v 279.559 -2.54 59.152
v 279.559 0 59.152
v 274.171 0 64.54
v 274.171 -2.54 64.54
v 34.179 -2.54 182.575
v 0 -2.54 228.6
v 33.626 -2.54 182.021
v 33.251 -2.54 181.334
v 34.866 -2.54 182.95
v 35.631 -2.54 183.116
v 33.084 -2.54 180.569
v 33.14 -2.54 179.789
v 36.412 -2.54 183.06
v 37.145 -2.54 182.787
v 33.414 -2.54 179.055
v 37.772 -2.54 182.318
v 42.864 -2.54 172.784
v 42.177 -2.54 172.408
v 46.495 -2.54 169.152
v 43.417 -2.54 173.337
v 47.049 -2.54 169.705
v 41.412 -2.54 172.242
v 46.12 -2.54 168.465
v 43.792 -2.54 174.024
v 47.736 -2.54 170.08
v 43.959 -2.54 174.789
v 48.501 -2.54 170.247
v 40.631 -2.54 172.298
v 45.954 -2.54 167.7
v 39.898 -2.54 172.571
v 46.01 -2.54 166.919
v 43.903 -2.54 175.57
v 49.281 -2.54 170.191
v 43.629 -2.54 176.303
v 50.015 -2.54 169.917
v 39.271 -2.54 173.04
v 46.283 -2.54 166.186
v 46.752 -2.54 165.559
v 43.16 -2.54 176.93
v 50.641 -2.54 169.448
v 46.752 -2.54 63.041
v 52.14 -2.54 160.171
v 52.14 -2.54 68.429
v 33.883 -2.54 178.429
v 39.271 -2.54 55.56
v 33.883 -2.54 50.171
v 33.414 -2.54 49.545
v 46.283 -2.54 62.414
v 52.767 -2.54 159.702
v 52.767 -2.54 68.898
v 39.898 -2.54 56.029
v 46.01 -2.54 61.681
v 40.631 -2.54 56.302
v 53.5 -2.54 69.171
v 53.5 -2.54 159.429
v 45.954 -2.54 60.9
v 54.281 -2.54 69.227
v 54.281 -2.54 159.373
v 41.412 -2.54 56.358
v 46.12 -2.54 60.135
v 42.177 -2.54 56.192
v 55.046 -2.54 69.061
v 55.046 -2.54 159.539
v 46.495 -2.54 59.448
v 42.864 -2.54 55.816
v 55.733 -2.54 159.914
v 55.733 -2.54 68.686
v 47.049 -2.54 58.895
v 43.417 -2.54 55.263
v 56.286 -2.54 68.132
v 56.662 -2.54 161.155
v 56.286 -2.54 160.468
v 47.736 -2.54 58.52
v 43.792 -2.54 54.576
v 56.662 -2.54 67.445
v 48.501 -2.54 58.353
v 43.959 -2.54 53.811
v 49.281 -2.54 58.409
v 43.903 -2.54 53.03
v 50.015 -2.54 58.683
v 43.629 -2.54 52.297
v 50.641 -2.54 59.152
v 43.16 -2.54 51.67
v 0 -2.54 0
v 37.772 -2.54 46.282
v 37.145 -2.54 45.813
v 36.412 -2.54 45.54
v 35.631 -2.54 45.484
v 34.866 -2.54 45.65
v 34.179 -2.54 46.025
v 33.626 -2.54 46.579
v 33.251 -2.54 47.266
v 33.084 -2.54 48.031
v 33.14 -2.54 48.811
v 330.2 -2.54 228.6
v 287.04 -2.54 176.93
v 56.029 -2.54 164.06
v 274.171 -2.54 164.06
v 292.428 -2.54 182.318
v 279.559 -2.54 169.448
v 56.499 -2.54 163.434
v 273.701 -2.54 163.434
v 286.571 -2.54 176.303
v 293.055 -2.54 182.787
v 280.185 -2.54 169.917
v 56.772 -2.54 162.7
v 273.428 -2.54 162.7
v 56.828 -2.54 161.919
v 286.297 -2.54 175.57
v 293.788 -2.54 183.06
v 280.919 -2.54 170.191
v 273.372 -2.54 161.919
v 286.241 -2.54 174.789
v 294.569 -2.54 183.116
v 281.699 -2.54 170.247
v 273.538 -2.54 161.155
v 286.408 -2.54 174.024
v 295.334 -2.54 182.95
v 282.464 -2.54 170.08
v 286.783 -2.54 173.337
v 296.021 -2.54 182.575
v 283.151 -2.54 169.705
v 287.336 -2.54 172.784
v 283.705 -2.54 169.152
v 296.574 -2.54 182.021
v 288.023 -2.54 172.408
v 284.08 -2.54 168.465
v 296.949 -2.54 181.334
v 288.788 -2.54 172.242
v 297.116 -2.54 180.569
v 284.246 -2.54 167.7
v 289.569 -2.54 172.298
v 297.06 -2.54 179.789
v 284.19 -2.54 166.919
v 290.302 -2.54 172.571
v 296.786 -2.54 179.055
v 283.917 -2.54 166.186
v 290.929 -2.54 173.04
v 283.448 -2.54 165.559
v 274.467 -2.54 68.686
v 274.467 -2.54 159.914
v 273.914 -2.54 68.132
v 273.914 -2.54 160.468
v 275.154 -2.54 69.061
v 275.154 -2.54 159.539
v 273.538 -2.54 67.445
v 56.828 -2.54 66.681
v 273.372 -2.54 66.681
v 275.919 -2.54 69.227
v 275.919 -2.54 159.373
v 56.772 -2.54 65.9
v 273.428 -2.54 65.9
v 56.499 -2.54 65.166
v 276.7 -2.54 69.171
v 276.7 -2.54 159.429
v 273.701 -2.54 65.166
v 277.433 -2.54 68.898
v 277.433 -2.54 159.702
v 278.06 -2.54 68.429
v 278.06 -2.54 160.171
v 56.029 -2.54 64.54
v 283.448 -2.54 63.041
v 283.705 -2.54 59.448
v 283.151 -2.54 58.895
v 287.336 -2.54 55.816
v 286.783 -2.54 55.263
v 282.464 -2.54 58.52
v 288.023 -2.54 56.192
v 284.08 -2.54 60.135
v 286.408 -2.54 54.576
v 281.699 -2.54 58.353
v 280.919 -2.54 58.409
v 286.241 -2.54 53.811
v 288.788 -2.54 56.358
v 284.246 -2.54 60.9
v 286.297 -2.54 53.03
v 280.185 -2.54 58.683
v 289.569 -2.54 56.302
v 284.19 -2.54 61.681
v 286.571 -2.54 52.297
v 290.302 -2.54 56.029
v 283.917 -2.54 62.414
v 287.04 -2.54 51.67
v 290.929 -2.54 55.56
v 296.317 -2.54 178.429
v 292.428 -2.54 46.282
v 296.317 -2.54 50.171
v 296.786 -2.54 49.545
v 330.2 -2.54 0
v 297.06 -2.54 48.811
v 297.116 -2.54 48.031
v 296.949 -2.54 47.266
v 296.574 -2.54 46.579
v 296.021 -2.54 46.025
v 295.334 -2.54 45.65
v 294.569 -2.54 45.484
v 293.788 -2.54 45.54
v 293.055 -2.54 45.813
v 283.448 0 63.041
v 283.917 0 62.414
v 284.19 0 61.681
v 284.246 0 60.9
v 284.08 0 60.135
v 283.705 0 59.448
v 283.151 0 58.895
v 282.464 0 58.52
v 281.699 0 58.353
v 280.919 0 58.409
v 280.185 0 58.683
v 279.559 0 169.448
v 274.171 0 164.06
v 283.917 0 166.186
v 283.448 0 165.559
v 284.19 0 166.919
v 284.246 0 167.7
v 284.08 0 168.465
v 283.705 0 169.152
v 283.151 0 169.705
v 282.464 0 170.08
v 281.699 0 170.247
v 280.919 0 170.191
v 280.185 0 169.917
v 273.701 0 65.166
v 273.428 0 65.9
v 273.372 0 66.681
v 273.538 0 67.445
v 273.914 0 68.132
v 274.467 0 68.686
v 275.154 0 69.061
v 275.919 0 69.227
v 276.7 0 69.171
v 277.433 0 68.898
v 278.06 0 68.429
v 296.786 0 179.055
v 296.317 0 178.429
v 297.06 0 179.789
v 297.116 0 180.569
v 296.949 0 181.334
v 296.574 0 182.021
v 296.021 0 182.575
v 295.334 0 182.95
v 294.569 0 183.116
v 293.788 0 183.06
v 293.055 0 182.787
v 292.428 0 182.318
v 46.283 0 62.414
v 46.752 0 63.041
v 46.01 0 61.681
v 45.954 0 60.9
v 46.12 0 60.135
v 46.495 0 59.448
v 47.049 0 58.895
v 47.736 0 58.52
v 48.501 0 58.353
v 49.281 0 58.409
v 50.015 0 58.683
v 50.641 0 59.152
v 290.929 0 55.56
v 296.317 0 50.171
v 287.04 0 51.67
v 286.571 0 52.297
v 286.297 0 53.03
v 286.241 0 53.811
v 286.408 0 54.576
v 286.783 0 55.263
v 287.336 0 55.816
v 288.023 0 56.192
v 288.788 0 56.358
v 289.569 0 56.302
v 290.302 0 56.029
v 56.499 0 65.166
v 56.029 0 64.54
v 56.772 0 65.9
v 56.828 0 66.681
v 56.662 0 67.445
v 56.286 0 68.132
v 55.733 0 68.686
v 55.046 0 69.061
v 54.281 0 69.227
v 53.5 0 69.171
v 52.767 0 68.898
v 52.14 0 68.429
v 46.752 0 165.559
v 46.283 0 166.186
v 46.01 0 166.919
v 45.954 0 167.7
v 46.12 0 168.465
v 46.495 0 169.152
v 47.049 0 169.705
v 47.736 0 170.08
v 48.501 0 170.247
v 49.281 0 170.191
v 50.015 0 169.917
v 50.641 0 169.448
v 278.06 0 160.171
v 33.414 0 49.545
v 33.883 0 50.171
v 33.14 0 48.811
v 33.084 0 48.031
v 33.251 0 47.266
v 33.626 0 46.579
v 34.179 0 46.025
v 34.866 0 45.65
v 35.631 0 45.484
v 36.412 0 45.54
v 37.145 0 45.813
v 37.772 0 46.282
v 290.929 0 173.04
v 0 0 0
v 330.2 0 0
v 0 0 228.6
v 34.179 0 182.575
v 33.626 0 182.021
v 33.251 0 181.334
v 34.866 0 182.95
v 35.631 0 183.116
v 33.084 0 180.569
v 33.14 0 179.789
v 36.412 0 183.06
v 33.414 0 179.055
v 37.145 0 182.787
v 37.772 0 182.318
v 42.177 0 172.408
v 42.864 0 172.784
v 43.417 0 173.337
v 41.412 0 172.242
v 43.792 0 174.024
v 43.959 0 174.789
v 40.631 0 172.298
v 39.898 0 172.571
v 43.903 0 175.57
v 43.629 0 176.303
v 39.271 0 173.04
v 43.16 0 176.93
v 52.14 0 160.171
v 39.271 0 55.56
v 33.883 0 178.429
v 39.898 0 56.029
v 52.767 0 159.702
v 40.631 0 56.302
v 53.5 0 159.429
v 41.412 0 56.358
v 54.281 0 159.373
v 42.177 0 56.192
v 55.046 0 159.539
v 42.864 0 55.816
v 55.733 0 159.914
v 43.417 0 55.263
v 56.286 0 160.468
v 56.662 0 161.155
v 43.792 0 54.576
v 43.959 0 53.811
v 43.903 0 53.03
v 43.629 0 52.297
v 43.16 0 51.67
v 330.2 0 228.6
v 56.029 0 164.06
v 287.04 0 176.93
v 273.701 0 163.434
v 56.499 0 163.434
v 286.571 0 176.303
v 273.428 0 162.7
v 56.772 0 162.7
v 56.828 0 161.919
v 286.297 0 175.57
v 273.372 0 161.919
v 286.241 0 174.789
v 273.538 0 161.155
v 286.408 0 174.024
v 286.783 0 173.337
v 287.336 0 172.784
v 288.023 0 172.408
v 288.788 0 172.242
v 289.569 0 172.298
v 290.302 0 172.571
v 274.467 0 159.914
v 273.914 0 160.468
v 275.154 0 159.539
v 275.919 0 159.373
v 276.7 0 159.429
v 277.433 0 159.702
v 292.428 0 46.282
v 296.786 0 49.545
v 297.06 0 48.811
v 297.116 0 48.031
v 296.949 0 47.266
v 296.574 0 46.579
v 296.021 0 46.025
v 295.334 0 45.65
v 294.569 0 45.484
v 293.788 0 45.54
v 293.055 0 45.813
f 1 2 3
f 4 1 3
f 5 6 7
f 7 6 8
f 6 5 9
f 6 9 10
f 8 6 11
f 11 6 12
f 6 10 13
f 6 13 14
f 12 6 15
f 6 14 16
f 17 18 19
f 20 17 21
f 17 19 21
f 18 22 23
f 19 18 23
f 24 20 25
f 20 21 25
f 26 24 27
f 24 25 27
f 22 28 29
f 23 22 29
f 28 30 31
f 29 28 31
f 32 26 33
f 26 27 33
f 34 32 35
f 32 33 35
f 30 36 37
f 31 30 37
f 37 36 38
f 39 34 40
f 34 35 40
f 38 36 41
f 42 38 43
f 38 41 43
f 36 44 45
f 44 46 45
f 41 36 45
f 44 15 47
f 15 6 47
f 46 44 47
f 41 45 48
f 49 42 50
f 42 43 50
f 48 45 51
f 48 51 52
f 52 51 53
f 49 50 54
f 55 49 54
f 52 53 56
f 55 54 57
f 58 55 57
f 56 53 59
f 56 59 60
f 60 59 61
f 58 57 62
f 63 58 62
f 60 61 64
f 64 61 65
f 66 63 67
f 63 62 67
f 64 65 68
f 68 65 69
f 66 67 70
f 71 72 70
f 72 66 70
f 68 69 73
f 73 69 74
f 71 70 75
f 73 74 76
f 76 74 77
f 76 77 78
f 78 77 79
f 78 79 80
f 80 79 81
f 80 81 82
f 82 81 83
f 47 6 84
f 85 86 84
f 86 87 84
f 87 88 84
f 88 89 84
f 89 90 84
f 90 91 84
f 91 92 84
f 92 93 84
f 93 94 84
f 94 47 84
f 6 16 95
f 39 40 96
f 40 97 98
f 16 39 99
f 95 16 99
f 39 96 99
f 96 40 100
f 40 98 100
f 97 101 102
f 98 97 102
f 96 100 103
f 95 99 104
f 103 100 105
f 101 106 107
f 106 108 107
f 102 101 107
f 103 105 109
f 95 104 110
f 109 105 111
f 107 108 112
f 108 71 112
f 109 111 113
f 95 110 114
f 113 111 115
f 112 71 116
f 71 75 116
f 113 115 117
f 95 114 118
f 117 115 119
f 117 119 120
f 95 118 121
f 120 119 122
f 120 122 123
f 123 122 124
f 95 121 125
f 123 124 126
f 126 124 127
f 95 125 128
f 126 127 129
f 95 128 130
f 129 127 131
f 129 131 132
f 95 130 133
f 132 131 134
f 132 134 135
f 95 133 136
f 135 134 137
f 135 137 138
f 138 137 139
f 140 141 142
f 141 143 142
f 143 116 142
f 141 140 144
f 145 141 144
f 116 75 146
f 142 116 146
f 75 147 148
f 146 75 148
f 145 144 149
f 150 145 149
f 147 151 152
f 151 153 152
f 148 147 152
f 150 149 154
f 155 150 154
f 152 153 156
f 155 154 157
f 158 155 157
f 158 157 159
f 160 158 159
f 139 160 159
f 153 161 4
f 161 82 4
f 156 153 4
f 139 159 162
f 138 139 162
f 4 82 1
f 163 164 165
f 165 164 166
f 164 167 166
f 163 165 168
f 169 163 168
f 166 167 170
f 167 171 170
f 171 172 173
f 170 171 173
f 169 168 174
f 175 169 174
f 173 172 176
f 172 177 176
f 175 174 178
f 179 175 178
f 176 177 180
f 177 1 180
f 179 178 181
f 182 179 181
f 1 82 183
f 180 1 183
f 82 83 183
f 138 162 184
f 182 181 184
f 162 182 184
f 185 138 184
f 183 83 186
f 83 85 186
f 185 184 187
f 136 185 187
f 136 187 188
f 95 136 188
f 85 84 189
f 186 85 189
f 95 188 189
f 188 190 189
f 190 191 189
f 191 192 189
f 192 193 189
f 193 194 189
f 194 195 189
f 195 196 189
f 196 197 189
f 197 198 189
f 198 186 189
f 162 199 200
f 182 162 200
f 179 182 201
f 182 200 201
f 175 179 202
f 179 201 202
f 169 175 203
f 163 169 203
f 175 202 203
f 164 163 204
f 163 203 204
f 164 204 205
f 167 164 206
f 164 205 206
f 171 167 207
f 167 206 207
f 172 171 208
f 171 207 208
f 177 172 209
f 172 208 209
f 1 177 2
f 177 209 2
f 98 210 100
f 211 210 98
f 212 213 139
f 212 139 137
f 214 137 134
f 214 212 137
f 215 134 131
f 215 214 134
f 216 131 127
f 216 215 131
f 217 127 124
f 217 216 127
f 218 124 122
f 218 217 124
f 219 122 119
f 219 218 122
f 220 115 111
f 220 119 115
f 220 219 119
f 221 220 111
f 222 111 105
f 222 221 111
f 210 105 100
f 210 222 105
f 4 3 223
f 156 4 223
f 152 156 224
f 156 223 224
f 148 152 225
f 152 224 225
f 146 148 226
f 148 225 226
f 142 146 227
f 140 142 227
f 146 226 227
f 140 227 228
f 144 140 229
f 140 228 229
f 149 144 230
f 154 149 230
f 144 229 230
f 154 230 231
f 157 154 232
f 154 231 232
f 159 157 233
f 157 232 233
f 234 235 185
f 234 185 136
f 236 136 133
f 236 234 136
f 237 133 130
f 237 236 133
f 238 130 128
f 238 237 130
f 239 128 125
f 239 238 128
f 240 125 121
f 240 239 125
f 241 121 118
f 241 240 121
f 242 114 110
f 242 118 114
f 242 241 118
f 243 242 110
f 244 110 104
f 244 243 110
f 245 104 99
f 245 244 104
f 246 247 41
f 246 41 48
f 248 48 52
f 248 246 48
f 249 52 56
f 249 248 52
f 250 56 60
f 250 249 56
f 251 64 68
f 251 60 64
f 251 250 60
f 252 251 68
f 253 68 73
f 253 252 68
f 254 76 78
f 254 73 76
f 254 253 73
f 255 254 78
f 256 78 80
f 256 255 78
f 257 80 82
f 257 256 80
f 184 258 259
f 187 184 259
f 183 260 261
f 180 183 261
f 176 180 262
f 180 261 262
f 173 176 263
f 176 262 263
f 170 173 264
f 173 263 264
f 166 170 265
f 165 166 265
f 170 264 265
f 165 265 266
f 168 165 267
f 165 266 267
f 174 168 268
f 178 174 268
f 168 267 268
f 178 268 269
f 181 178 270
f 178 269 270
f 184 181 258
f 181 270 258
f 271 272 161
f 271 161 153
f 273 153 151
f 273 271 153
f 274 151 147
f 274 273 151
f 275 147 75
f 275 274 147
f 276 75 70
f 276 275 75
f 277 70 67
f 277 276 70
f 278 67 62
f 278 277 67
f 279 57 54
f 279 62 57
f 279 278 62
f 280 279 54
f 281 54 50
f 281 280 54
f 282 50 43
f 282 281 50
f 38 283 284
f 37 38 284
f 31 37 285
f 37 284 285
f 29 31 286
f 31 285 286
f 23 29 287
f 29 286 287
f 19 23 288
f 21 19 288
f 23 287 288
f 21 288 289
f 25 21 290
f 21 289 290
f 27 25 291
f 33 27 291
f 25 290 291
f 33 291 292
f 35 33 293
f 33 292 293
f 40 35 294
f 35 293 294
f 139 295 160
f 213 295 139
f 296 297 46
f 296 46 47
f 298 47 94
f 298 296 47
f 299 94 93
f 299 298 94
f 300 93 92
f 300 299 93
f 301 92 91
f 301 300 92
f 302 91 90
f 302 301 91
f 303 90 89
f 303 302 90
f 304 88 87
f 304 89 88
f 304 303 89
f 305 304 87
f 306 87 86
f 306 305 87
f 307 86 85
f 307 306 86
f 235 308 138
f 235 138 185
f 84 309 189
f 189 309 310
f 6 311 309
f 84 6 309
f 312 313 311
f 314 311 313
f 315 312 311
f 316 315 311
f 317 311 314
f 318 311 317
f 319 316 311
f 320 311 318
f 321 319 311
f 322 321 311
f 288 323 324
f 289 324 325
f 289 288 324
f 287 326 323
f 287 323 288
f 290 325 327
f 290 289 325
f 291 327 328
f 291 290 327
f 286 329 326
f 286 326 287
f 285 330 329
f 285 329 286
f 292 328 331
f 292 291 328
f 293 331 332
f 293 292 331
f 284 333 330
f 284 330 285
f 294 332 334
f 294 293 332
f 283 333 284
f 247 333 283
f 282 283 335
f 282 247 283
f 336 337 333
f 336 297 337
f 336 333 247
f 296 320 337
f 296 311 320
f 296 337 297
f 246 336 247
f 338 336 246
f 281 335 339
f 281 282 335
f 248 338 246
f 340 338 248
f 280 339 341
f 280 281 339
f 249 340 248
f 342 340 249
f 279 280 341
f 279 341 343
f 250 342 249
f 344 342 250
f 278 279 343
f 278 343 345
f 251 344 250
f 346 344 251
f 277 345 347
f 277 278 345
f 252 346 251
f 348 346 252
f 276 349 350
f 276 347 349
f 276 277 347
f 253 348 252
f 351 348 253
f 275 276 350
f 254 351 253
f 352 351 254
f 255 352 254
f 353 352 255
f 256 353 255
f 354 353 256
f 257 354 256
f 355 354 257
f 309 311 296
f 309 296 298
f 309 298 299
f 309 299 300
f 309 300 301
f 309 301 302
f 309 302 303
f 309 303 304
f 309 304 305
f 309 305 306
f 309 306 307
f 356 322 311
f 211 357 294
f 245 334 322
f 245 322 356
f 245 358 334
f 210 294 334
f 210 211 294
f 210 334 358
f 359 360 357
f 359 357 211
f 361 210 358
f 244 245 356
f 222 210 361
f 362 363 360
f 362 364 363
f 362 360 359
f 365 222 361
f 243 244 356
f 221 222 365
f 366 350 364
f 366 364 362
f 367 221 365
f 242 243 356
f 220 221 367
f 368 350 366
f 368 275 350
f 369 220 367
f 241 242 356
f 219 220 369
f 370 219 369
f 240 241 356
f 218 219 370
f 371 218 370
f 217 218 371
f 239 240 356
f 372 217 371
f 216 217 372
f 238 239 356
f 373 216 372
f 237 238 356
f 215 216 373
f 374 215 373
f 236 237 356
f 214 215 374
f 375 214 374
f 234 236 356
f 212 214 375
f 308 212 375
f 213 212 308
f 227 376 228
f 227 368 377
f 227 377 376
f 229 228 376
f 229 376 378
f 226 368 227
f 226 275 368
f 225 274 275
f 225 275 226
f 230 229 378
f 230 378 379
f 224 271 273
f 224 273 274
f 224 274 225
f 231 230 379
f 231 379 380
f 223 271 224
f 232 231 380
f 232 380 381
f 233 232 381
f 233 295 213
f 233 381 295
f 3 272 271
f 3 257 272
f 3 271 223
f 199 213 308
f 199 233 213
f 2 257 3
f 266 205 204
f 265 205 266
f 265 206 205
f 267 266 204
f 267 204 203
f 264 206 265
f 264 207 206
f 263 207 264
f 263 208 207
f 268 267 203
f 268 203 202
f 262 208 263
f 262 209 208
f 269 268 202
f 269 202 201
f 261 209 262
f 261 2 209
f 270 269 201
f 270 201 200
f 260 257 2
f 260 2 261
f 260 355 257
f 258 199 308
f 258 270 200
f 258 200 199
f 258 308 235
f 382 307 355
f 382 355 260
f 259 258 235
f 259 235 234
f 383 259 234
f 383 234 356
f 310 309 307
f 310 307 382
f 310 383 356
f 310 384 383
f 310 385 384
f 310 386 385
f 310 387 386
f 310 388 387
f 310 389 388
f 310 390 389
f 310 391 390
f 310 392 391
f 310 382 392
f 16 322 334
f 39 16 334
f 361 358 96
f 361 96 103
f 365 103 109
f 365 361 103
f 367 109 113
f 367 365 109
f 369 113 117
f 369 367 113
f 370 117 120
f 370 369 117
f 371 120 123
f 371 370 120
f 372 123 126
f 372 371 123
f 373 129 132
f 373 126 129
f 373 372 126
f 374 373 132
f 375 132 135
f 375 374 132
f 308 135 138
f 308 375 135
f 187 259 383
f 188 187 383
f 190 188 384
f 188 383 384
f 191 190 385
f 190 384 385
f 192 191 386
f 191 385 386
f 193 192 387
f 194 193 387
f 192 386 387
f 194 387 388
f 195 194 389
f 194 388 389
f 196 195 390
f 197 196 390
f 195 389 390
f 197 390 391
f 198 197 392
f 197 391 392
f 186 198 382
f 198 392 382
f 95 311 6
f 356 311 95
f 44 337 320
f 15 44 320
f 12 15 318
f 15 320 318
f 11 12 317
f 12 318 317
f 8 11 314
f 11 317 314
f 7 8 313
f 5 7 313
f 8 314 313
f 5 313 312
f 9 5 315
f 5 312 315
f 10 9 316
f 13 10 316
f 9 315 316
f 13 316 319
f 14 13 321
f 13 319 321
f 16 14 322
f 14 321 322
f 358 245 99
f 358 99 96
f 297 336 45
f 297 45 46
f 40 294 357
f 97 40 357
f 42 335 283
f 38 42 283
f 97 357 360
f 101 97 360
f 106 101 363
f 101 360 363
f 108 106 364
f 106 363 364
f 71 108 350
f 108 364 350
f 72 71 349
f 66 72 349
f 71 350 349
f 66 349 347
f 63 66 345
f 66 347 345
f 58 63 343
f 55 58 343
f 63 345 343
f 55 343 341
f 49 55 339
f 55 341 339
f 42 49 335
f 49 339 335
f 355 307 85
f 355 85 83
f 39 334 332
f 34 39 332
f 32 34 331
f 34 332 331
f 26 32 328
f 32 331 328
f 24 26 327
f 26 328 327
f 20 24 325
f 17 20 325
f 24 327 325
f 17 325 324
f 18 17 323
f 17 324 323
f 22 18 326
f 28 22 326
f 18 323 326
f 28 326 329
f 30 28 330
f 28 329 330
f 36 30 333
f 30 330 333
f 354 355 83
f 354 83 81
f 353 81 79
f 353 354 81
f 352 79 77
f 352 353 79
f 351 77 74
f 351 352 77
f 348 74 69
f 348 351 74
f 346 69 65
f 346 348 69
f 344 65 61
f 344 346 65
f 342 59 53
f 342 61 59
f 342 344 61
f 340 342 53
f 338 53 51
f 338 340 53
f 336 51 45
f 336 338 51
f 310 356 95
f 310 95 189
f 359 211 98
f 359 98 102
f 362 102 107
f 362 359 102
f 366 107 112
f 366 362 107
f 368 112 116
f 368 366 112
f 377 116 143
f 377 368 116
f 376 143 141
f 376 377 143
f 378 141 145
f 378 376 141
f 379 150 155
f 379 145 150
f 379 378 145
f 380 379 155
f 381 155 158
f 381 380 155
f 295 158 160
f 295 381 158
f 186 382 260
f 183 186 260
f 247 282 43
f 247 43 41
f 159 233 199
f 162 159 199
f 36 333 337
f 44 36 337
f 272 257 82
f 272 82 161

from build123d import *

# Parameters (mm, degrees)
SKETCH1_W          = 330.2
SKETCH1_H          = 228.6
BASE_PLATE_DEPTH   = 2.54
CUT_EXTRUDE9_DEPTH = 402.617294946


with BuildPart() as part:
    # Sketch1 → base plate (new body)
    with BuildSketch(Plane(origin=(0, 0, 0), x_dir=(1, 0, 0), z_dir=(0, 1, 0))):
        with Locations((165.1, -114.3)):
            Rectangle(SKETCH1_W, SKETCH1_H)
    extrude(amount=-BASE_PLATE_DEPTH)

    # Sketch3 → Cut-Extrude9 (cut, through all)
    with BuildSketch(Plane(origin=(0, 0, 0), x_dir=(1, 0, 0), z_dir=(0, 1, 0))):
        with BuildLine():
            ThreePointArc((43.160130962, -51.670448323), (43.160130962, -55.559535744), (39.271043541, -55.559535744))
            Line((39.271043541, -55.559535744), (33.882889868, -50.171382072))
            ThreePointArc((33.882889868, -50.171382072), (33.882889868, -46.282294651), (37.771977289, -46.282294651))
            Line((37.771977289, -46.282294651), (43.160130962, -51.670448323))
        make_face()
        with BuildLine():
            Line((292.428022711, -46.282294651), (287.039869038, -51.670448323))
            ThreePointArc((287.039869038, -51.670448323), (287.039869038, -55.559535744), (290.928956459, -55.559535744))
            Line((290.928956459, -55.559535744), (296.317110132, -50.171382072))
            ThreePointArc((296.317110132, -50.171382072), (296.317110132, -46.282294651), (292.428022711, -46.282294651))
        make_face()
        with BuildLine():
            Line((278.059612917, -68.428879286), (283.44776659, -63.040725614))
            ThreePointArc((283.44776659, -63.040725614), (283.44776659, -59.151638193), (279.558679169, -59.151638193))
            Line((279.558679169, -59.151638193), (274.170525496, -64.539791865))
            ThreePointArc((274.170525496, -64.539791865), (274.170525496, -68.428879286), (278.059612917, -68.428879286))
        make_face()
        with BuildLine():
            ThreePointArc((283.44776659, -165.559274386), (283.44776659, -169.448361807), (279.558679169, -169.448361807))
            Line((279.558679169, -169.448361807), (274.170525496, -164.060208135))
            ThreePointArc((274.170525496, -164.060208135), (274.170525496, -160.171120714), (278.059612917, -160.171120714))
            Line((278.059612917, -160.171120714), (283.44776659, -165.559274386))
        make_face()
        with BuildLine():
            ThreePointArc((287.039869038, -176.929551677), (287.039869038, -173.040464256), (290.928956459, -173.040464256))
            Line((290.928956459, -173.040464256), (296.317110132, -178.428617928))
            ThreePointArc((296.317110132, -178.428617928), (296.317110132, -182.317705349), (292.428022711, -182.317705349))
            Line((292.428022711, -182.317705349), (287.039869038, -176.929551677))
        make_face()
        with BuildLine():
            Line((37.771977289, -182.317705349), (43.160130962, -176.929551677))
            ThreePointArc((43.160130962, -176.929551677), (43.160130962, -173.040464256), (39.271043541, -173.040464256))
            Line((39.271043541, -173.040464256), (33.882889868, -178.428617928))
            ThreePointArc((33.882889868, -178.428617928), (33.882889868, -182.317705349), (37.771977289, -182.317705349))
        make_face()
        with BuildLine():
            Line((52.140387083, -160.171120714), (46.75223341, -165.559274386))
            ThreePointArc((46.75223341, -165.559274386), (46.75223341, -169.448361807), (50.641320831, -169.448361807))
            Line((50.641320831, -169.448361807), (56.029474504, -164.060208135))
            ThreePointArc((56.029474504, -164.060208135), (56.029474504, -160.171120714), (52.140387083, -160.171120714))
        make_face()
        with BuildLine():
            Line((52.140387083, -68.428879286), (46.75223341, -63.040725614))
            ThreePointArc((46.75223341, -63.040725614), (46.75223341, -59.151638193), (50.641320831, -59.151638193))
            Line((50.641320831, -59.151638193), (56.029474504, -64.539791865))
            ThreePointArc((56.029474504, -64.539791865), (56.029474504, -68.428879286), (52.140387083, -68.428879286))
        make_face()
    extrude(amount=-CUT_EXTRUDE9_DEPTH, mode=Mode.SUBTRACT)


solid = part.part
